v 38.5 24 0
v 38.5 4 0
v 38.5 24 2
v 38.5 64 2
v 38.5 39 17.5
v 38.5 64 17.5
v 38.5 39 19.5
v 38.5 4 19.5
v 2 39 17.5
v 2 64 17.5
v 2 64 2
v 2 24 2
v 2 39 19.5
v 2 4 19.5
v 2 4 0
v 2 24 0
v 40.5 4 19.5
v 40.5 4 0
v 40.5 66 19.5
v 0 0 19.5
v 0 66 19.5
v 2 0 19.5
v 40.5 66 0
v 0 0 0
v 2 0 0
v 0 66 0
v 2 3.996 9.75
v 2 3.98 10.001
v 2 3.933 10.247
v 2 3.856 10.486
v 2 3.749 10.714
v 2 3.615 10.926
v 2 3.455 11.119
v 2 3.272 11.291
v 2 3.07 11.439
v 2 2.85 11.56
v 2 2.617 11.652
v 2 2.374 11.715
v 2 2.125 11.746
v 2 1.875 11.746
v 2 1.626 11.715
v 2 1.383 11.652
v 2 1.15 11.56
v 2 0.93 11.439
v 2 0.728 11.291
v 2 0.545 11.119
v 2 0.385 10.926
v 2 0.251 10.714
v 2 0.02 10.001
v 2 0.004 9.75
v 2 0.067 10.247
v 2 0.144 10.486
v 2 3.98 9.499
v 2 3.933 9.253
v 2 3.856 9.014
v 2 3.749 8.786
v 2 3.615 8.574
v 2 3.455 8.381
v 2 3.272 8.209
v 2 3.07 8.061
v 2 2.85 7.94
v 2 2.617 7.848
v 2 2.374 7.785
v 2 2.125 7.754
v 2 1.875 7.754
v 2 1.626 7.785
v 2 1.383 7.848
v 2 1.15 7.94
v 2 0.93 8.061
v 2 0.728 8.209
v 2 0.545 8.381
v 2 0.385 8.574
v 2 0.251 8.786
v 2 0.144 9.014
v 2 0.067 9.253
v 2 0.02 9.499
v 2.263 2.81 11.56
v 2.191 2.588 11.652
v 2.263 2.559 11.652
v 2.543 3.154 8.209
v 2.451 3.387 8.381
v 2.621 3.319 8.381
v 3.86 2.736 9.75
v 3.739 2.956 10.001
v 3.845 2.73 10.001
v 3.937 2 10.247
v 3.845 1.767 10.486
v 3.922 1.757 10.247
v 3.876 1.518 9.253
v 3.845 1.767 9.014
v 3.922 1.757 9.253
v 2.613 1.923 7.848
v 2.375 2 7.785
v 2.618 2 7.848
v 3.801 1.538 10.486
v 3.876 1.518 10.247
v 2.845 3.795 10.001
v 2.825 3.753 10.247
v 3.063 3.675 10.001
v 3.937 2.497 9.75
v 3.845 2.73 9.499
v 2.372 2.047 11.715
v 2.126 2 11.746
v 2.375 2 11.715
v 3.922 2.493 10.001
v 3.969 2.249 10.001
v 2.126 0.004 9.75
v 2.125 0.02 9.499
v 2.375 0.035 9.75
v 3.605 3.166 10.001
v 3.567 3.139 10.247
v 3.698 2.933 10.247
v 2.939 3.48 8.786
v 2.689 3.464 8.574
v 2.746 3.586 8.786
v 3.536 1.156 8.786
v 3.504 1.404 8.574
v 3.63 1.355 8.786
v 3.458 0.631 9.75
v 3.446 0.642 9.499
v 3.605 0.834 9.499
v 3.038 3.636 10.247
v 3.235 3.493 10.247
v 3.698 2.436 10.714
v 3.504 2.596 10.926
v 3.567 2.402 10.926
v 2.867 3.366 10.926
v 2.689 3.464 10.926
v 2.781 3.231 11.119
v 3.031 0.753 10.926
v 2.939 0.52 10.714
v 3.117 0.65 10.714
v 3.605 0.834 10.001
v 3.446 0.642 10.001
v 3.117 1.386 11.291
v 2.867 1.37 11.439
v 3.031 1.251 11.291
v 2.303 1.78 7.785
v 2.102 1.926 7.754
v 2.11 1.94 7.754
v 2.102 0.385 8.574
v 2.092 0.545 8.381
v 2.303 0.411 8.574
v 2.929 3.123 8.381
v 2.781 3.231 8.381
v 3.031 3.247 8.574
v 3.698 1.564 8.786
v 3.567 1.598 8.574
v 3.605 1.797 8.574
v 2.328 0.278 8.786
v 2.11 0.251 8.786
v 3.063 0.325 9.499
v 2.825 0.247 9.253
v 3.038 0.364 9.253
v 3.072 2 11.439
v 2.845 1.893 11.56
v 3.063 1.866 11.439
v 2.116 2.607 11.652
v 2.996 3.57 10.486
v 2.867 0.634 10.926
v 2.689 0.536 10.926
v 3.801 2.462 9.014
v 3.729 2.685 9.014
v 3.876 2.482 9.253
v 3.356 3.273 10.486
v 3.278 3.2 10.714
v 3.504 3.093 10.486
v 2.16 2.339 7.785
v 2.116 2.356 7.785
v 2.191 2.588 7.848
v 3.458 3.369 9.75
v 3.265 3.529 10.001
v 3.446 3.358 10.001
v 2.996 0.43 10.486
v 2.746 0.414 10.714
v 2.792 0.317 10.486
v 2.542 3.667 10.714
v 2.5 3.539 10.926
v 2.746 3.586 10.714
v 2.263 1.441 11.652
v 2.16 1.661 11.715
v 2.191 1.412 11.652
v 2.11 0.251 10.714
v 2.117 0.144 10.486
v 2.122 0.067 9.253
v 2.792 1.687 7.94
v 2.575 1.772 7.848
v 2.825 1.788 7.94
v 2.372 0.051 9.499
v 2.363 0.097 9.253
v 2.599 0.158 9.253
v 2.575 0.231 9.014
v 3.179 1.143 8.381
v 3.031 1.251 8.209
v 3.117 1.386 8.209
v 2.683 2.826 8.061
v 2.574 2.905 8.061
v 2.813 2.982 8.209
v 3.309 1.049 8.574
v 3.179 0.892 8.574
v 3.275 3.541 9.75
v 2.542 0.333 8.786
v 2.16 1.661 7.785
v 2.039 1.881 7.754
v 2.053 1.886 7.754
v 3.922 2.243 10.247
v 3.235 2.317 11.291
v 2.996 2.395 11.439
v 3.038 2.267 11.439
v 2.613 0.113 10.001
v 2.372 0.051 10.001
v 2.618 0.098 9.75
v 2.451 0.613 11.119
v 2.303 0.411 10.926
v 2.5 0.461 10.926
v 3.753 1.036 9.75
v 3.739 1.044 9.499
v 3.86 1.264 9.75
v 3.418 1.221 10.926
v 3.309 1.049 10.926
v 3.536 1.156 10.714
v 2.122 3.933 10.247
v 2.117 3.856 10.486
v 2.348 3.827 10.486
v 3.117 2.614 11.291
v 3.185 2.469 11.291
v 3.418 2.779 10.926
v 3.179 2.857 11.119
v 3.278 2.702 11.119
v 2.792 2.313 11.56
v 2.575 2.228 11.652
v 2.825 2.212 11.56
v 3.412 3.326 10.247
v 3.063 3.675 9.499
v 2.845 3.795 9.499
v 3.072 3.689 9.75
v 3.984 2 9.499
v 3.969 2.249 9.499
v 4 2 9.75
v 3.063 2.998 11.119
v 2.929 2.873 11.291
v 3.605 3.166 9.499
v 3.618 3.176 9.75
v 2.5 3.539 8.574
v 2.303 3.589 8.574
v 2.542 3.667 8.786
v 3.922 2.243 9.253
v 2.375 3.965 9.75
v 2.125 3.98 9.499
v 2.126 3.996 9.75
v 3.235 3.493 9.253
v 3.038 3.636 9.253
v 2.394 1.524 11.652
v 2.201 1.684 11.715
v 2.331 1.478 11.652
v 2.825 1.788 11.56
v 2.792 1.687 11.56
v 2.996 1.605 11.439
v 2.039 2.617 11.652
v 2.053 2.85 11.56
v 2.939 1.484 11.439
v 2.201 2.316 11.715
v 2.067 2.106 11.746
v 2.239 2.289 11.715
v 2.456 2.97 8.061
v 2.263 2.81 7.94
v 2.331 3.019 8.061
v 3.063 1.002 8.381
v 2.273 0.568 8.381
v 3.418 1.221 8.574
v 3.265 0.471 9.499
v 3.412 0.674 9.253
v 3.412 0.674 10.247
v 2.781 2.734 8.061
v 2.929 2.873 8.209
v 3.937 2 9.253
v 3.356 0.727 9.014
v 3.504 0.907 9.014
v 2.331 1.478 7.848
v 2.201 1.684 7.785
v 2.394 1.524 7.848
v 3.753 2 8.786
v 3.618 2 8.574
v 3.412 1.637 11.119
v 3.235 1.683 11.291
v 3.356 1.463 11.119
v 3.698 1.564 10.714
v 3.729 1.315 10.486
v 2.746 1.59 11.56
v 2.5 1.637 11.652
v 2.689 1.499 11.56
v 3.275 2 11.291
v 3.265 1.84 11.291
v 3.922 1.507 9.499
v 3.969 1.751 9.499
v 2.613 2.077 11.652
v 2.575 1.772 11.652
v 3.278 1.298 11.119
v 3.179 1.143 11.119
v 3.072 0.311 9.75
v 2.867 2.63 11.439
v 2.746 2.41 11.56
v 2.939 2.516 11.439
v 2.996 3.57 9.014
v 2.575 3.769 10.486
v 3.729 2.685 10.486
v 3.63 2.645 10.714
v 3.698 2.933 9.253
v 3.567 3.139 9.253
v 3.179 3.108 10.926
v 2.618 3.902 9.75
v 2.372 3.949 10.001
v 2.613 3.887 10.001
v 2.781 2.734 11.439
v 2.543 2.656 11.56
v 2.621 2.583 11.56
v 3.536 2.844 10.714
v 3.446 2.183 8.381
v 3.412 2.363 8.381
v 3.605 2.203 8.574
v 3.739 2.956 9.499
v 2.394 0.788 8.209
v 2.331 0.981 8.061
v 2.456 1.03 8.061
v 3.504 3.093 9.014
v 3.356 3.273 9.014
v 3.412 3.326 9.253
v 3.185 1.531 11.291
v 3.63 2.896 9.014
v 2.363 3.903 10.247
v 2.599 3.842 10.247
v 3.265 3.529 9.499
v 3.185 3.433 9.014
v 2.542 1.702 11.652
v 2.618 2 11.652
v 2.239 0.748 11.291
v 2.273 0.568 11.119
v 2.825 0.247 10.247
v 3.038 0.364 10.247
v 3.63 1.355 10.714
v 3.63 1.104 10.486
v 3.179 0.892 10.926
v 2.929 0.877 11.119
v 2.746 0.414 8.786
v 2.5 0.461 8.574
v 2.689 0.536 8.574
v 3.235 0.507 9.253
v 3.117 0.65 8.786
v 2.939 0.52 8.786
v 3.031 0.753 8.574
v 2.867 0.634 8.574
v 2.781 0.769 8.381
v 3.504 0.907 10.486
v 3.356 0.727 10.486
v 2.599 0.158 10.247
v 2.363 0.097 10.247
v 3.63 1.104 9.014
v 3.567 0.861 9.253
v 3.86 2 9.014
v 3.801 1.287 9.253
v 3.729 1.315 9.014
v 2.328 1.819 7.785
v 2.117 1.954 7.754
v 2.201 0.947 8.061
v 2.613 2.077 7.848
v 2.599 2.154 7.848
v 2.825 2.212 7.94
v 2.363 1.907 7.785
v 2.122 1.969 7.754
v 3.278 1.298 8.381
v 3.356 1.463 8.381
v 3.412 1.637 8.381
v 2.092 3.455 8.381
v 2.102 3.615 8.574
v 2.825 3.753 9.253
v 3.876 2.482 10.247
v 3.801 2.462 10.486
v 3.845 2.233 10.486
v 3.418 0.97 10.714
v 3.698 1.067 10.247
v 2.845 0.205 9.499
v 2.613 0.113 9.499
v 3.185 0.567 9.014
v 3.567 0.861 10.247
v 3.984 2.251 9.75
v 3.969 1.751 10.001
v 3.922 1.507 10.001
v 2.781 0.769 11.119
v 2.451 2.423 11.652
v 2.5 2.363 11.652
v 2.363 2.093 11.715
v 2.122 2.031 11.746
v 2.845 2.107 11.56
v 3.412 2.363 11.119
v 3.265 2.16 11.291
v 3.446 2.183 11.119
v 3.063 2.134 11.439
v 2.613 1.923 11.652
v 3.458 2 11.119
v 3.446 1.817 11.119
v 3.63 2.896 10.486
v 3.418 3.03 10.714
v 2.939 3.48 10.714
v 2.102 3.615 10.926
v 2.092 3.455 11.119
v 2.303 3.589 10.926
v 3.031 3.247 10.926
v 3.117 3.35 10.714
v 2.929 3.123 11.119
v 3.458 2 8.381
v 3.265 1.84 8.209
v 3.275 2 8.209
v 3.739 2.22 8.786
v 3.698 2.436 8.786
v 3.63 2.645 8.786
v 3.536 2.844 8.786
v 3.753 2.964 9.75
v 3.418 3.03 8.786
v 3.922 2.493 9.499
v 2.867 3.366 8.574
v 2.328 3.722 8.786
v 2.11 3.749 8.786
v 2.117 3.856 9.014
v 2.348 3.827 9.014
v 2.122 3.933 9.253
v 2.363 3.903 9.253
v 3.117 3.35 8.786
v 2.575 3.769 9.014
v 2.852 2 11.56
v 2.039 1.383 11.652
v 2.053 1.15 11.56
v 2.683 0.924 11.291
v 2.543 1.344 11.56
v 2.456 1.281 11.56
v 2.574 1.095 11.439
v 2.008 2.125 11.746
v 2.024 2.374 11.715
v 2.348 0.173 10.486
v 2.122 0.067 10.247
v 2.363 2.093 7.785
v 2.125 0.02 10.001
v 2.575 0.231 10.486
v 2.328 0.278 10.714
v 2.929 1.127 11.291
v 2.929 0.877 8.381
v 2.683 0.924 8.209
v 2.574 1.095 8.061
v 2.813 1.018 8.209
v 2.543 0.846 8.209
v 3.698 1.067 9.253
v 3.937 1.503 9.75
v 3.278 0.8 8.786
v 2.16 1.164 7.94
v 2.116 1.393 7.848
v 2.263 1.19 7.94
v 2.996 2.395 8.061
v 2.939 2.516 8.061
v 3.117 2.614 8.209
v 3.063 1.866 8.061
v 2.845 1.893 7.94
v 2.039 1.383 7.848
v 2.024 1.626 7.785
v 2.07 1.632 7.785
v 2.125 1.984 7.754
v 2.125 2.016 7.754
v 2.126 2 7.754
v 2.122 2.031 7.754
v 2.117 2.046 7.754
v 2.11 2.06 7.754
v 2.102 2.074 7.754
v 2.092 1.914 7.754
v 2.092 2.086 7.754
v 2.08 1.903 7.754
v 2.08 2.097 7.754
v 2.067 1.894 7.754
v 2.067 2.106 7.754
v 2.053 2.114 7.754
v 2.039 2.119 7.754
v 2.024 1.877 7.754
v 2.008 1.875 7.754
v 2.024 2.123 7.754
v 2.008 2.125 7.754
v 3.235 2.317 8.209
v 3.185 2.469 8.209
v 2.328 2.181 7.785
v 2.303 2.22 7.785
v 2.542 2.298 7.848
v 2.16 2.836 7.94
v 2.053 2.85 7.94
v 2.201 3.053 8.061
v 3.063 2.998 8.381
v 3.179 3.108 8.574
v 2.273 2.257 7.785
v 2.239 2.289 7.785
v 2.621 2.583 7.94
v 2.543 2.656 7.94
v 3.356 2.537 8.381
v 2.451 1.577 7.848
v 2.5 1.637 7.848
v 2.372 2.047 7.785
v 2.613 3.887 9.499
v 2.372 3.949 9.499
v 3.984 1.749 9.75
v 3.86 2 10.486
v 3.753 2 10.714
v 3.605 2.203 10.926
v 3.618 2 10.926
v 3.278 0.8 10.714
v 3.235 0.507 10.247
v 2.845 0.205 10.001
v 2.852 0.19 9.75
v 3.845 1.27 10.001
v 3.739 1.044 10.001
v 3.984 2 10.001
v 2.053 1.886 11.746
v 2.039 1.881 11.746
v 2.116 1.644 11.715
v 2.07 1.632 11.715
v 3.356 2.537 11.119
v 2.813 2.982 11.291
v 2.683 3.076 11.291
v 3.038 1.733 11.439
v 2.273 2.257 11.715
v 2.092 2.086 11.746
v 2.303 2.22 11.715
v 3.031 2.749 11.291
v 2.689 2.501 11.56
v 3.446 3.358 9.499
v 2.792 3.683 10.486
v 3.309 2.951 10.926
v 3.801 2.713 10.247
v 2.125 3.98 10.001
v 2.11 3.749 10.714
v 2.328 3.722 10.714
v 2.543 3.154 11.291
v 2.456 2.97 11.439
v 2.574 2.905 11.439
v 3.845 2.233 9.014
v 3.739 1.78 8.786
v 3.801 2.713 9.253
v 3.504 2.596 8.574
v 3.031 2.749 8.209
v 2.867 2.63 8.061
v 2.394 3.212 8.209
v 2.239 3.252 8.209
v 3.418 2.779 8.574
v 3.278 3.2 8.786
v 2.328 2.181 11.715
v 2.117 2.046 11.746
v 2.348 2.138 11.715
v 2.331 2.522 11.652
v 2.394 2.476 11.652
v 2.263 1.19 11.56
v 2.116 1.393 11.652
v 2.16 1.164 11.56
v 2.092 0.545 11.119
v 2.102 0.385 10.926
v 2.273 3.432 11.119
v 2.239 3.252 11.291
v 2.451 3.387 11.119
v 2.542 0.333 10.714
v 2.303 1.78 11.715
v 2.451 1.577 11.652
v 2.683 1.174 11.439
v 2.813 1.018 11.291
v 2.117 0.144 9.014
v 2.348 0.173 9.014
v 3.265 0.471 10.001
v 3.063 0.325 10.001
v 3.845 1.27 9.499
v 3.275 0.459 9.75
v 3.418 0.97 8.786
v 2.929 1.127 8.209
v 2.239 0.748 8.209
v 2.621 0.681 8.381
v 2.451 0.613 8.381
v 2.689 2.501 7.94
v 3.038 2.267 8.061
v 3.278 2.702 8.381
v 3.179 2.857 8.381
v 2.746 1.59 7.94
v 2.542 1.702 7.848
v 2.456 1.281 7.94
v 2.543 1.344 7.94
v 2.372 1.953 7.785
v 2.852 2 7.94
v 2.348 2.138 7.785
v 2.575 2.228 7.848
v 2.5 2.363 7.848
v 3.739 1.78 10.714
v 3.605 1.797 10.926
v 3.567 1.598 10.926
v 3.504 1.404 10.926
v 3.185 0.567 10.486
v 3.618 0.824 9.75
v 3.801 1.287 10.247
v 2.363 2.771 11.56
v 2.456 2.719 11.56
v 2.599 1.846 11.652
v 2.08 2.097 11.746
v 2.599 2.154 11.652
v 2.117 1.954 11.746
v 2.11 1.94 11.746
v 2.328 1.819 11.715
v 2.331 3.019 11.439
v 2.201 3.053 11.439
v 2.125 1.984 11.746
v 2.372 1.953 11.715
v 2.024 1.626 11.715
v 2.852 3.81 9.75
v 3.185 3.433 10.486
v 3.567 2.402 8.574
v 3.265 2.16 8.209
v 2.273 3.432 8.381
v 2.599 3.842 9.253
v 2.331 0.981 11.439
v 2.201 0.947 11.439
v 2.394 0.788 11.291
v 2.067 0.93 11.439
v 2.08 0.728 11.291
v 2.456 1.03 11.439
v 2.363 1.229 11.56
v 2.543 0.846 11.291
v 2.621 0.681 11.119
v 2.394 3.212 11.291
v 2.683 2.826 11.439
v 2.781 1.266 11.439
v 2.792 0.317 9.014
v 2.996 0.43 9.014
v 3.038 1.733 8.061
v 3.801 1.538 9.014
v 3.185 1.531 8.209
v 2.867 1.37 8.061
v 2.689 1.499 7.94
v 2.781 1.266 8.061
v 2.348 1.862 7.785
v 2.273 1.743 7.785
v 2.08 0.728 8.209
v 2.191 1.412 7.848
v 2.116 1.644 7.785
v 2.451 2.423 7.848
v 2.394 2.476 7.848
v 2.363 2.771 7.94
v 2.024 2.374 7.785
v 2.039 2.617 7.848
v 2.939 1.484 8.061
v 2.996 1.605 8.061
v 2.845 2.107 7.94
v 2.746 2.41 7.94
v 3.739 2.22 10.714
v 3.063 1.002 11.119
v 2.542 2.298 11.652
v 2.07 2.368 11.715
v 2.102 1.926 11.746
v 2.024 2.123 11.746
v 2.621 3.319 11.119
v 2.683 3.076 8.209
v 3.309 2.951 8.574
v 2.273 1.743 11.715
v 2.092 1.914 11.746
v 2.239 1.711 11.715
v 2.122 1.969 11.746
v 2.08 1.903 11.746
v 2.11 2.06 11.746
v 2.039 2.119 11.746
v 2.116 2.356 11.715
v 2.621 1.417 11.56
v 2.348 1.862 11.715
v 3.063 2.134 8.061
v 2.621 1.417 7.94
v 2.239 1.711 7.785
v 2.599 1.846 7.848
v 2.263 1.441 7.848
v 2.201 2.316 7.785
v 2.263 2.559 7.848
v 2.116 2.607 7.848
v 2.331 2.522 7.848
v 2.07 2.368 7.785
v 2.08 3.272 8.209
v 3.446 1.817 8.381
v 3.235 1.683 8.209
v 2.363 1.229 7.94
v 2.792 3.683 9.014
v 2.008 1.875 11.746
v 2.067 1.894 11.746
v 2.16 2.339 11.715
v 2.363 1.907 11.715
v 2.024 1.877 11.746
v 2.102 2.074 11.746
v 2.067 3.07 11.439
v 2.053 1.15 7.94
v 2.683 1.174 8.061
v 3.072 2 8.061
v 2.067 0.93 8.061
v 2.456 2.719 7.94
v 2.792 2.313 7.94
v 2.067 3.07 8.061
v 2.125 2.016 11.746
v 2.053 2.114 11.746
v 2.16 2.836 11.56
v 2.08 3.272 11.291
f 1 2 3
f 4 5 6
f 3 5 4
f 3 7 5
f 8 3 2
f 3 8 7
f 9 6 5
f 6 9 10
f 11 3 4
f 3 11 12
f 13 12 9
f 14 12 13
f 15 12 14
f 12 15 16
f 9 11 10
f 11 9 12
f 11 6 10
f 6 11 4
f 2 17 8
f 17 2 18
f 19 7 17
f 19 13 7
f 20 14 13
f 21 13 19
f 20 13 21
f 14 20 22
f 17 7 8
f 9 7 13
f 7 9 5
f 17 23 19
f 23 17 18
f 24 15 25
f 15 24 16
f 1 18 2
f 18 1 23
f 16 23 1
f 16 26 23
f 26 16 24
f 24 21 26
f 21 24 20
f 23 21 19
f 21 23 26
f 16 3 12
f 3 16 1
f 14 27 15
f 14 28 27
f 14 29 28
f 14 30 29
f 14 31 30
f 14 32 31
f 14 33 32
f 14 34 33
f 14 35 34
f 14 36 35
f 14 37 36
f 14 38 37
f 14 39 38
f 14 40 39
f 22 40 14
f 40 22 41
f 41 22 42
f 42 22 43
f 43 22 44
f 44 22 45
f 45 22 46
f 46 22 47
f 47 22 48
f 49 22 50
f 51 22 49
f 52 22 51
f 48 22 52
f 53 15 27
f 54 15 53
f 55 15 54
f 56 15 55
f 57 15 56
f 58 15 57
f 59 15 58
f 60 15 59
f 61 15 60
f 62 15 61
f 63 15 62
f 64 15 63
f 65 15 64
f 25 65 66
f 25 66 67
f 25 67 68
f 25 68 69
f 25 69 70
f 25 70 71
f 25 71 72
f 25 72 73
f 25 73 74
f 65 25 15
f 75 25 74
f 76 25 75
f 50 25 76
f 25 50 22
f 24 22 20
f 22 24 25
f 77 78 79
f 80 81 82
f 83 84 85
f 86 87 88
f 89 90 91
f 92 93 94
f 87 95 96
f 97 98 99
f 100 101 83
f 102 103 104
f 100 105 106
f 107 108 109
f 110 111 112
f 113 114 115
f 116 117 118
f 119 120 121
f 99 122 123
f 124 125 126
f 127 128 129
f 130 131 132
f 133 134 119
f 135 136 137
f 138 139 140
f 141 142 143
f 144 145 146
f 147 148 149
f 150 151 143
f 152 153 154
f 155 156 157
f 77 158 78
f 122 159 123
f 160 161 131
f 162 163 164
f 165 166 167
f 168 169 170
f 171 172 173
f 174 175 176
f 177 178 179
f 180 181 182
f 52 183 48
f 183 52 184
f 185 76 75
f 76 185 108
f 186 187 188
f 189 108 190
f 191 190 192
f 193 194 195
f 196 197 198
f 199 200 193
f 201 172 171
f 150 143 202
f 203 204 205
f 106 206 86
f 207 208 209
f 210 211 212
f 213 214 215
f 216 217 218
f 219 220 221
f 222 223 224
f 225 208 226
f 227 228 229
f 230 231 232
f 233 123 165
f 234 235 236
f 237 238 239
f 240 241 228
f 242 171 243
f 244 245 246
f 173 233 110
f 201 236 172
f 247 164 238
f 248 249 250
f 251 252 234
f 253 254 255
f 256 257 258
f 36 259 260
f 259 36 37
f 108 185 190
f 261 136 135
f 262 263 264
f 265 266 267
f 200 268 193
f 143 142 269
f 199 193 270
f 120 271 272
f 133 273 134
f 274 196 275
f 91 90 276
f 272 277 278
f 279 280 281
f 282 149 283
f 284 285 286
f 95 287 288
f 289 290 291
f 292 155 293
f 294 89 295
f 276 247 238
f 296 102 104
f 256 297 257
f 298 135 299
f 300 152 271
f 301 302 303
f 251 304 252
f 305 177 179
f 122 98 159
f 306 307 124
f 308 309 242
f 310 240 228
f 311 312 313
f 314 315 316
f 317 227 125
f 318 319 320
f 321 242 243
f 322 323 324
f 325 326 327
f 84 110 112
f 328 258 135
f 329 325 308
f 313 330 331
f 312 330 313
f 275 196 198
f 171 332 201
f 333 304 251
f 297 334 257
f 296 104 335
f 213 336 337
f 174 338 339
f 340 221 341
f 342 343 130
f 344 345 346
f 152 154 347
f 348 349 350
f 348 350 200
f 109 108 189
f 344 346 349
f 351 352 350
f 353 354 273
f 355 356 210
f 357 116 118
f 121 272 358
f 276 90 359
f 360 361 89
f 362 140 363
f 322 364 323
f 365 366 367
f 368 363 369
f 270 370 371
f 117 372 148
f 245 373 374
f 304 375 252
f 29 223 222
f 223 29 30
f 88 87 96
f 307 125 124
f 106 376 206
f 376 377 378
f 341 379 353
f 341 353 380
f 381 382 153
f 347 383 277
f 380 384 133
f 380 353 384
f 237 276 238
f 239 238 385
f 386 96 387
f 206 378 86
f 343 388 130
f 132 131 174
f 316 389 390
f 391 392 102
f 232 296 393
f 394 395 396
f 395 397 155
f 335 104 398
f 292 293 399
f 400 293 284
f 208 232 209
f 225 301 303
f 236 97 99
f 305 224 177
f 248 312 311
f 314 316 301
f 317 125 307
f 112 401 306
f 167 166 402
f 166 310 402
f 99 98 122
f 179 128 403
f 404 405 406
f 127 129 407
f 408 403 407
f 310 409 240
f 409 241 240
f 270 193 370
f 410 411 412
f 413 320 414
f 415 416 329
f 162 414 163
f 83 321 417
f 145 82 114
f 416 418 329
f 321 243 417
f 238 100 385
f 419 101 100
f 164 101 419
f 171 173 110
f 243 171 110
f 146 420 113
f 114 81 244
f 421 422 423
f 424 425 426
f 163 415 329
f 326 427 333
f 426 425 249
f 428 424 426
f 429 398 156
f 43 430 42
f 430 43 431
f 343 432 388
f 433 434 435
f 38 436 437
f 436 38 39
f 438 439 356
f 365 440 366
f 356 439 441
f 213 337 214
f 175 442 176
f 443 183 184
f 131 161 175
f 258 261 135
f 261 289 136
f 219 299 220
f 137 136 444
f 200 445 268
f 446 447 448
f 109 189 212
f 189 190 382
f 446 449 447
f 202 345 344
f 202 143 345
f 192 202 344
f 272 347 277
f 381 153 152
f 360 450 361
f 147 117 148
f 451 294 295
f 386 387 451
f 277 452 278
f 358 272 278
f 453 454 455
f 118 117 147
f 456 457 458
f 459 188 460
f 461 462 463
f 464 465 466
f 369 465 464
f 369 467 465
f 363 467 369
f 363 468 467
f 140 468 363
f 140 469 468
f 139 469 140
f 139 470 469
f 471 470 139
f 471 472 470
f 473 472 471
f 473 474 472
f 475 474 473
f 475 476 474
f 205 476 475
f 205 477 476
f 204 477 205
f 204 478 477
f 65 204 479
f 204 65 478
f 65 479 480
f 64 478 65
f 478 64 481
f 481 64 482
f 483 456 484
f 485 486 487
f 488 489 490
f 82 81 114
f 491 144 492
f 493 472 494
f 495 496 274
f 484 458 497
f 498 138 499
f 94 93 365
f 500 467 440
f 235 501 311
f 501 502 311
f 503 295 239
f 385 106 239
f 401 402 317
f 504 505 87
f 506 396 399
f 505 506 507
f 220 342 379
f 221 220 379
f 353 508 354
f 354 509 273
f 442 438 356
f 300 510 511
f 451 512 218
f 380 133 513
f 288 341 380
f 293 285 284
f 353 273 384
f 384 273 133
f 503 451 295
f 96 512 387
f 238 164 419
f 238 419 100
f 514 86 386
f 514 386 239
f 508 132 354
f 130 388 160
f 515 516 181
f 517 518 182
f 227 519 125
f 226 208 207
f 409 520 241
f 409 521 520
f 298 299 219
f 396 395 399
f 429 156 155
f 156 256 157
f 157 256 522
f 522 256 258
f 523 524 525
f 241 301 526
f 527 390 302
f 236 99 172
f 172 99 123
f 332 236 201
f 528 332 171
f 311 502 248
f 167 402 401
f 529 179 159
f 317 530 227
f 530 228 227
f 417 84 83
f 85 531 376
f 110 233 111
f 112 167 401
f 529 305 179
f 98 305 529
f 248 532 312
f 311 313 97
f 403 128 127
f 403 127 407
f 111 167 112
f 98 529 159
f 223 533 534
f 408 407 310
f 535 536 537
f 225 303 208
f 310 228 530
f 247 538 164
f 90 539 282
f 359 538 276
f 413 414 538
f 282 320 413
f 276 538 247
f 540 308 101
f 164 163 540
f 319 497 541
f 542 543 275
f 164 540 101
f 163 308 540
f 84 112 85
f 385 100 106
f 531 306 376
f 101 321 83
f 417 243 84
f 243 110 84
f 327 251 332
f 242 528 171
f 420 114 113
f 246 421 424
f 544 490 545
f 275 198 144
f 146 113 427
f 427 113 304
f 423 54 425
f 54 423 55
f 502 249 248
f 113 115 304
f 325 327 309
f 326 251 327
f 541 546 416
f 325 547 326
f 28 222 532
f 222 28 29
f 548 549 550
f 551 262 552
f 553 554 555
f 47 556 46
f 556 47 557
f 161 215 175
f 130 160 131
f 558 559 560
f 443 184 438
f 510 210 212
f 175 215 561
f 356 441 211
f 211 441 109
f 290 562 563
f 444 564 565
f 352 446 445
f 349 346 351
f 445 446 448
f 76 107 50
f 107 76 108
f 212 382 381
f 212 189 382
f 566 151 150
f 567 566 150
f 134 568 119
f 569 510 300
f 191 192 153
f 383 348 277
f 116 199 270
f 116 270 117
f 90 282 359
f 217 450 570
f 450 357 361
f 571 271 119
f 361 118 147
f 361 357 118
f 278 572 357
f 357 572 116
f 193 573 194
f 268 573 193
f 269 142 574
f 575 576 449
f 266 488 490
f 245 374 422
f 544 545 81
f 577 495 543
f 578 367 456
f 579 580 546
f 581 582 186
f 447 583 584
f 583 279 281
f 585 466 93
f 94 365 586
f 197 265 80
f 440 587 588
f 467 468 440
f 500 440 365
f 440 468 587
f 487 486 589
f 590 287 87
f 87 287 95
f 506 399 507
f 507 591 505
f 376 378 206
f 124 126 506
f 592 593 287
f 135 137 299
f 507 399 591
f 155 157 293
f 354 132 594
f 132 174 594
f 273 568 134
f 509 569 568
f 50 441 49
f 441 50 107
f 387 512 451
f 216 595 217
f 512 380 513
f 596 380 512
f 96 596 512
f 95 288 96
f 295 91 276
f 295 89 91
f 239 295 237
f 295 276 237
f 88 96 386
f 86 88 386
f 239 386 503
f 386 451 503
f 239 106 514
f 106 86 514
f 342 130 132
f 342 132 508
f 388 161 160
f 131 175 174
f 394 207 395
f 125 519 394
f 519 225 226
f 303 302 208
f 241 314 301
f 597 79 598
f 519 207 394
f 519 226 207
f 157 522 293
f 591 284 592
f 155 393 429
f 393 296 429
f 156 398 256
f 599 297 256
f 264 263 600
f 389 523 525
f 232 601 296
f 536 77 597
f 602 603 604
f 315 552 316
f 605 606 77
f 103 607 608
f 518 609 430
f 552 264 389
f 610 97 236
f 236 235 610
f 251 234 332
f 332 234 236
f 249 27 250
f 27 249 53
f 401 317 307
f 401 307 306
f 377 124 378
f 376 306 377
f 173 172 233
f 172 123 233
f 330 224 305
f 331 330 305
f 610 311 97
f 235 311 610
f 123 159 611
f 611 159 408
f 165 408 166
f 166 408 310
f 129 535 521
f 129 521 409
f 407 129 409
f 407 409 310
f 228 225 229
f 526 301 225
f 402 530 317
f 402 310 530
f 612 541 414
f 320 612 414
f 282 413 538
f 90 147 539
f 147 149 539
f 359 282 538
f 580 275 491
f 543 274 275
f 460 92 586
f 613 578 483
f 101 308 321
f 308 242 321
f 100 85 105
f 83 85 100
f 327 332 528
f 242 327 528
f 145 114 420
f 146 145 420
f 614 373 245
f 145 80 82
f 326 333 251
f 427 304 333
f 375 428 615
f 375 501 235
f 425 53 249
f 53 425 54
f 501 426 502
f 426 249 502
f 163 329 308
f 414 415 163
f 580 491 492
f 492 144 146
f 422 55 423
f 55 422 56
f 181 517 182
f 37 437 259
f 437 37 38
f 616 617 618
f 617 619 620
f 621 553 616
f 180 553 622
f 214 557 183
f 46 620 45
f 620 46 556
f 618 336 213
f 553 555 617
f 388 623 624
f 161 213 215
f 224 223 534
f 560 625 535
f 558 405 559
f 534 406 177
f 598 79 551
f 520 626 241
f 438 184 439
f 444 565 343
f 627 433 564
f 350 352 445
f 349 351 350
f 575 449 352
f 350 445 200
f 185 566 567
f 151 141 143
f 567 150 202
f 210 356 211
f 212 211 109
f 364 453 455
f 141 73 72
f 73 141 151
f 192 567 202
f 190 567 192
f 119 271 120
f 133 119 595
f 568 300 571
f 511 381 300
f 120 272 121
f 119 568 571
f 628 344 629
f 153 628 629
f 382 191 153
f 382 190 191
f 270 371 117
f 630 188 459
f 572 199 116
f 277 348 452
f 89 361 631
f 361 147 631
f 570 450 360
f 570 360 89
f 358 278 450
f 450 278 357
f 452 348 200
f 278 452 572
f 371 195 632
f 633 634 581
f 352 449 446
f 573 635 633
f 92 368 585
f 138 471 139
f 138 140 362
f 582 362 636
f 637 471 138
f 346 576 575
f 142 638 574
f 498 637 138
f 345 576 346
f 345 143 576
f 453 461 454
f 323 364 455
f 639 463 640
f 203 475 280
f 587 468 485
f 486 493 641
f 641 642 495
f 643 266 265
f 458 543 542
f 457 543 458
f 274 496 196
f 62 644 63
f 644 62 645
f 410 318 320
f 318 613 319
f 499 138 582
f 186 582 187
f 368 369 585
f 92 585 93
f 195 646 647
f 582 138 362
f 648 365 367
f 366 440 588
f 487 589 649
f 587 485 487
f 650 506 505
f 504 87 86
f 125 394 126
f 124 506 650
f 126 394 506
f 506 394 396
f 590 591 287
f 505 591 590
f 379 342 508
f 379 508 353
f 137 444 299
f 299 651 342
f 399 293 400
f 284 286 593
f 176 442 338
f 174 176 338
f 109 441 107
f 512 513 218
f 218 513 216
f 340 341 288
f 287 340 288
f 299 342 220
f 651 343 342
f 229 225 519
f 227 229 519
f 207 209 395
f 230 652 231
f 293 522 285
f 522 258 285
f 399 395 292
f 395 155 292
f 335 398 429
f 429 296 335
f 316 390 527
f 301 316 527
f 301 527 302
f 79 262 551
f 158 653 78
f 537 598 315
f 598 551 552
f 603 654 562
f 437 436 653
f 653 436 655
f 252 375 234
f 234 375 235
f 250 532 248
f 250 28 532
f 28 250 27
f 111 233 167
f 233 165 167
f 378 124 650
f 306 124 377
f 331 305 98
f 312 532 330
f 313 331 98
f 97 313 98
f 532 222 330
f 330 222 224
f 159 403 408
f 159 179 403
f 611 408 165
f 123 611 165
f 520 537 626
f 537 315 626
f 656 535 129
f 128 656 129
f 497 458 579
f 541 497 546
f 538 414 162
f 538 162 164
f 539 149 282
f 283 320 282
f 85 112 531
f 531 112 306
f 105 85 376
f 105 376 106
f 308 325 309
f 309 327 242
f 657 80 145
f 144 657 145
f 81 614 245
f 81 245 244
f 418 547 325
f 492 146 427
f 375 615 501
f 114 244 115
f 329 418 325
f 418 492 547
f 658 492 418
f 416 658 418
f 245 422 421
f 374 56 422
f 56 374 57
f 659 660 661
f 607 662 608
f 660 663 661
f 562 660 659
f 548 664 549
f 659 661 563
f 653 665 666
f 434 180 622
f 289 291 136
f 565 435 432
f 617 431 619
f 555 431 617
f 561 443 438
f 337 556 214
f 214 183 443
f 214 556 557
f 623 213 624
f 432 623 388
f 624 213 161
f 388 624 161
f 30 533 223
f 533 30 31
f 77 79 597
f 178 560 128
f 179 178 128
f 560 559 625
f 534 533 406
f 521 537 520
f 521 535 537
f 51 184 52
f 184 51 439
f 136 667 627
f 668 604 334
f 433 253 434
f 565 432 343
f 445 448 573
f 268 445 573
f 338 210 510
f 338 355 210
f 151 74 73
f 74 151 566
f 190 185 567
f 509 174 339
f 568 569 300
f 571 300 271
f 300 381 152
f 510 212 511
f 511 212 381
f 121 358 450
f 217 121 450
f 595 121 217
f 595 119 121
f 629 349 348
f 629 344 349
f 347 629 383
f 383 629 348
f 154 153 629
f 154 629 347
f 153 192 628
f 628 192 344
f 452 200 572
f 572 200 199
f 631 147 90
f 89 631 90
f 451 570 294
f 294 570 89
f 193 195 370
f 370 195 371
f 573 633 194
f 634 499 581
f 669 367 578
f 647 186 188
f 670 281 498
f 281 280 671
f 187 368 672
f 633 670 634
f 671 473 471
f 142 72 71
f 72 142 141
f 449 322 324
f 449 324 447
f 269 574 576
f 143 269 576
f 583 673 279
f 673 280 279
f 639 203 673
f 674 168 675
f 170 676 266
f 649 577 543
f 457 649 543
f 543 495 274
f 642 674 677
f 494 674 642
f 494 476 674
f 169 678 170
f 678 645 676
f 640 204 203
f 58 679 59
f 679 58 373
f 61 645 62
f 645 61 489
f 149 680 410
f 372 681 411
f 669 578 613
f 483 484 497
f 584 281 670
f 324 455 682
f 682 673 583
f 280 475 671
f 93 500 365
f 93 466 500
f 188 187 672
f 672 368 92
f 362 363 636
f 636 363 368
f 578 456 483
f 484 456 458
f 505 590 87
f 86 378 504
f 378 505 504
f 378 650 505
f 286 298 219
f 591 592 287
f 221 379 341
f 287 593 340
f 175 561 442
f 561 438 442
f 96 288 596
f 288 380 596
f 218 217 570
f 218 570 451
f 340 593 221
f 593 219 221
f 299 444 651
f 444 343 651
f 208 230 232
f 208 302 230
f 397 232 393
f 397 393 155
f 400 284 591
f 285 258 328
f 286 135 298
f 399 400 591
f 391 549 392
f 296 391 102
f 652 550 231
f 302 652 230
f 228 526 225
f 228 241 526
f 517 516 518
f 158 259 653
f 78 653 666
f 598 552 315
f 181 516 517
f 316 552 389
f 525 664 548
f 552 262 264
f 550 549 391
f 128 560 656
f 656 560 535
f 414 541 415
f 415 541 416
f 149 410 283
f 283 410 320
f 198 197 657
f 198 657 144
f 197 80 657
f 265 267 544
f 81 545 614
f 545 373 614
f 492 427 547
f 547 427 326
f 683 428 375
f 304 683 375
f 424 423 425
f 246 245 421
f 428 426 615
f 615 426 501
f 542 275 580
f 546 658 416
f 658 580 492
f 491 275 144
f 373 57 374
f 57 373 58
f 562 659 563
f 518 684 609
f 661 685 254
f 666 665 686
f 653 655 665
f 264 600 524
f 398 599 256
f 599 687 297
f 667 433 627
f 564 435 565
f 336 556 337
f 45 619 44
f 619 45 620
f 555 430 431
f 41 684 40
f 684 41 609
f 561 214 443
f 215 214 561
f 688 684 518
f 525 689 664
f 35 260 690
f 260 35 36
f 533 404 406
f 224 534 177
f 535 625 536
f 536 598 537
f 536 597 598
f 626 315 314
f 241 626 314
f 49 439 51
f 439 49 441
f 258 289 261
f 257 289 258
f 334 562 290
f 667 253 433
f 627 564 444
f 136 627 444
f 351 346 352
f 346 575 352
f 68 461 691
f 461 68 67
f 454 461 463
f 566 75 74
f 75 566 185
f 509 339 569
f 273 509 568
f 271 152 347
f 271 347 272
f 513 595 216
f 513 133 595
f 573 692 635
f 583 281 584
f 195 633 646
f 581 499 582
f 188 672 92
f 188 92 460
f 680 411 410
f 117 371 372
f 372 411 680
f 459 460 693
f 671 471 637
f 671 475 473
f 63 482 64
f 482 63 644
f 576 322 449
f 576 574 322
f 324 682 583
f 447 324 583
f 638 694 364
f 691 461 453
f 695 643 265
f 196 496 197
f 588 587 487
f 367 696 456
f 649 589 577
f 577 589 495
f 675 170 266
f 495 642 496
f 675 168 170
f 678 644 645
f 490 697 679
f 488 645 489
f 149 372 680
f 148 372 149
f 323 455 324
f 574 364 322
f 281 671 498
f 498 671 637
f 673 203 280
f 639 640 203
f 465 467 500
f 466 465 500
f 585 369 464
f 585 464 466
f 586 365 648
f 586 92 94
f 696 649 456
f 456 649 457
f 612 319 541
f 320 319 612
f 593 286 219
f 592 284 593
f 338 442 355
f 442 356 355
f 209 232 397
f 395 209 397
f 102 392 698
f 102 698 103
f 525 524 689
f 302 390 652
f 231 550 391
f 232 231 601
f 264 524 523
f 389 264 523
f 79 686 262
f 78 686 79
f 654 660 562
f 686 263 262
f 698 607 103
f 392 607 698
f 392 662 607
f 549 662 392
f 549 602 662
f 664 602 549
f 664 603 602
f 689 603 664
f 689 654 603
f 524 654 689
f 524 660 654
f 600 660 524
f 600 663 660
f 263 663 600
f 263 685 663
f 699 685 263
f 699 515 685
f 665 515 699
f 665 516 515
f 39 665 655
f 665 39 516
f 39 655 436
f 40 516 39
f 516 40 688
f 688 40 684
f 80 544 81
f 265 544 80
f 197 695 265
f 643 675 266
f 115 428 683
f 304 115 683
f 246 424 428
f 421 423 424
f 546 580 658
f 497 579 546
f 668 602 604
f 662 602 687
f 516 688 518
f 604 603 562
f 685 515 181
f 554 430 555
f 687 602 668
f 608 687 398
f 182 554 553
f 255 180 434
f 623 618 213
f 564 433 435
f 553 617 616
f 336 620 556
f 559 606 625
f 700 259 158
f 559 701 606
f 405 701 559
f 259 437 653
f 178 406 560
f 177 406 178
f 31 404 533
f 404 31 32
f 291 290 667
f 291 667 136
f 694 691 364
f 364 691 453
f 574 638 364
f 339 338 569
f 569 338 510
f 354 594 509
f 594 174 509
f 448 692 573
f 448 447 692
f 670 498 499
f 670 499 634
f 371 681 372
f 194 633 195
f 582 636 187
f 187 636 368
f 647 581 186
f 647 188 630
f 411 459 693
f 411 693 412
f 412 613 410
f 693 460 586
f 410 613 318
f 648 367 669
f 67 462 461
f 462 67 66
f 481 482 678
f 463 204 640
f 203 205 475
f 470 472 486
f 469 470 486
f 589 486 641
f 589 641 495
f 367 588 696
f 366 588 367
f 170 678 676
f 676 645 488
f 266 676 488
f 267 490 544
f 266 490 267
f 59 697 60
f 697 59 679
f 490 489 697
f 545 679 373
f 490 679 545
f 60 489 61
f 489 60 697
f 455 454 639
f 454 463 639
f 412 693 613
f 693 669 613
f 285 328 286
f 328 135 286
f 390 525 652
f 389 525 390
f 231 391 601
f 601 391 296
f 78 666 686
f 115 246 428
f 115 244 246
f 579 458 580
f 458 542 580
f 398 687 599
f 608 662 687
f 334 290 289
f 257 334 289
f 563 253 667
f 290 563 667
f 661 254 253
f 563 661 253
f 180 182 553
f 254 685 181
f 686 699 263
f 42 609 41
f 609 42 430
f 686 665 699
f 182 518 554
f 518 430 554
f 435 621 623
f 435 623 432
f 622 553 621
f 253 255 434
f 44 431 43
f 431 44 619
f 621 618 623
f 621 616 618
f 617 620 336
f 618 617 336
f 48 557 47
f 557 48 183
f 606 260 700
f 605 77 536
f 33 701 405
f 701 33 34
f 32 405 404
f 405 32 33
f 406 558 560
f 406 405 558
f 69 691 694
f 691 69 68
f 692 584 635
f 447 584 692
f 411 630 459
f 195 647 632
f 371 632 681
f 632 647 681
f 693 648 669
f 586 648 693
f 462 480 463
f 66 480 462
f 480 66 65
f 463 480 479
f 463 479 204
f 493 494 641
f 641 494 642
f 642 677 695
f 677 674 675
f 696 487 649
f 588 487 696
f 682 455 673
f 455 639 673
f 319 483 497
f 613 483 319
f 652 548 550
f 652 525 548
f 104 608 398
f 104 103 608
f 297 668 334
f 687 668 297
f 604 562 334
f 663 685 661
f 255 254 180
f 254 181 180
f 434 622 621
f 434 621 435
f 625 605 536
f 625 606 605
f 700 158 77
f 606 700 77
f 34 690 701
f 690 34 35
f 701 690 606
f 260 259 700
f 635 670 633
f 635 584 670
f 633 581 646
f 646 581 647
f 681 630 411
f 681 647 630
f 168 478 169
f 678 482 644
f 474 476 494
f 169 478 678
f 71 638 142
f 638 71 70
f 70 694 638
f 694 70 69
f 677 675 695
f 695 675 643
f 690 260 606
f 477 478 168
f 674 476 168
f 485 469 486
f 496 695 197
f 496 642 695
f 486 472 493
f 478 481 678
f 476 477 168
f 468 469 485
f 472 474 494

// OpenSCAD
battery_w = 36.5;
battery_d = 60;
battery_h = 15.5;
wall_tick = 2;
battery_contact_d  = 25;

lock_d    = 20;
look_sw   = 2;
look_sd   = 4;

union()
{
    //translate([0,0, wall_tick])
    cube([wall_tick, look_sd, battery_h + wall_tick*2], false);
    
    translate([wall_tick, look_sd/2, (battery_h + wall_tick*2)/2 ])
        sphere(d = look_sd, $fn = 50);
    
    translate([0,look_sd,0])
        difference()
        {
            cube([battery_w + wall_tick*2,battery_d+ wall_tick,battery_h+ wall_tick*2], false);
            translate([wall_tick,0,wall_tick])
            {
                #cube([battery_w,battery_d,battery_h], false);
                #cube([battery_w,battery_d-battery_contact_d,battery_h+wall_tick], false);
            }
            
             // Lock
            translate([wall_tick,0,0])
                #cube([battery_w,lock_d,battery_h+wall_tick], false);
        }
}
